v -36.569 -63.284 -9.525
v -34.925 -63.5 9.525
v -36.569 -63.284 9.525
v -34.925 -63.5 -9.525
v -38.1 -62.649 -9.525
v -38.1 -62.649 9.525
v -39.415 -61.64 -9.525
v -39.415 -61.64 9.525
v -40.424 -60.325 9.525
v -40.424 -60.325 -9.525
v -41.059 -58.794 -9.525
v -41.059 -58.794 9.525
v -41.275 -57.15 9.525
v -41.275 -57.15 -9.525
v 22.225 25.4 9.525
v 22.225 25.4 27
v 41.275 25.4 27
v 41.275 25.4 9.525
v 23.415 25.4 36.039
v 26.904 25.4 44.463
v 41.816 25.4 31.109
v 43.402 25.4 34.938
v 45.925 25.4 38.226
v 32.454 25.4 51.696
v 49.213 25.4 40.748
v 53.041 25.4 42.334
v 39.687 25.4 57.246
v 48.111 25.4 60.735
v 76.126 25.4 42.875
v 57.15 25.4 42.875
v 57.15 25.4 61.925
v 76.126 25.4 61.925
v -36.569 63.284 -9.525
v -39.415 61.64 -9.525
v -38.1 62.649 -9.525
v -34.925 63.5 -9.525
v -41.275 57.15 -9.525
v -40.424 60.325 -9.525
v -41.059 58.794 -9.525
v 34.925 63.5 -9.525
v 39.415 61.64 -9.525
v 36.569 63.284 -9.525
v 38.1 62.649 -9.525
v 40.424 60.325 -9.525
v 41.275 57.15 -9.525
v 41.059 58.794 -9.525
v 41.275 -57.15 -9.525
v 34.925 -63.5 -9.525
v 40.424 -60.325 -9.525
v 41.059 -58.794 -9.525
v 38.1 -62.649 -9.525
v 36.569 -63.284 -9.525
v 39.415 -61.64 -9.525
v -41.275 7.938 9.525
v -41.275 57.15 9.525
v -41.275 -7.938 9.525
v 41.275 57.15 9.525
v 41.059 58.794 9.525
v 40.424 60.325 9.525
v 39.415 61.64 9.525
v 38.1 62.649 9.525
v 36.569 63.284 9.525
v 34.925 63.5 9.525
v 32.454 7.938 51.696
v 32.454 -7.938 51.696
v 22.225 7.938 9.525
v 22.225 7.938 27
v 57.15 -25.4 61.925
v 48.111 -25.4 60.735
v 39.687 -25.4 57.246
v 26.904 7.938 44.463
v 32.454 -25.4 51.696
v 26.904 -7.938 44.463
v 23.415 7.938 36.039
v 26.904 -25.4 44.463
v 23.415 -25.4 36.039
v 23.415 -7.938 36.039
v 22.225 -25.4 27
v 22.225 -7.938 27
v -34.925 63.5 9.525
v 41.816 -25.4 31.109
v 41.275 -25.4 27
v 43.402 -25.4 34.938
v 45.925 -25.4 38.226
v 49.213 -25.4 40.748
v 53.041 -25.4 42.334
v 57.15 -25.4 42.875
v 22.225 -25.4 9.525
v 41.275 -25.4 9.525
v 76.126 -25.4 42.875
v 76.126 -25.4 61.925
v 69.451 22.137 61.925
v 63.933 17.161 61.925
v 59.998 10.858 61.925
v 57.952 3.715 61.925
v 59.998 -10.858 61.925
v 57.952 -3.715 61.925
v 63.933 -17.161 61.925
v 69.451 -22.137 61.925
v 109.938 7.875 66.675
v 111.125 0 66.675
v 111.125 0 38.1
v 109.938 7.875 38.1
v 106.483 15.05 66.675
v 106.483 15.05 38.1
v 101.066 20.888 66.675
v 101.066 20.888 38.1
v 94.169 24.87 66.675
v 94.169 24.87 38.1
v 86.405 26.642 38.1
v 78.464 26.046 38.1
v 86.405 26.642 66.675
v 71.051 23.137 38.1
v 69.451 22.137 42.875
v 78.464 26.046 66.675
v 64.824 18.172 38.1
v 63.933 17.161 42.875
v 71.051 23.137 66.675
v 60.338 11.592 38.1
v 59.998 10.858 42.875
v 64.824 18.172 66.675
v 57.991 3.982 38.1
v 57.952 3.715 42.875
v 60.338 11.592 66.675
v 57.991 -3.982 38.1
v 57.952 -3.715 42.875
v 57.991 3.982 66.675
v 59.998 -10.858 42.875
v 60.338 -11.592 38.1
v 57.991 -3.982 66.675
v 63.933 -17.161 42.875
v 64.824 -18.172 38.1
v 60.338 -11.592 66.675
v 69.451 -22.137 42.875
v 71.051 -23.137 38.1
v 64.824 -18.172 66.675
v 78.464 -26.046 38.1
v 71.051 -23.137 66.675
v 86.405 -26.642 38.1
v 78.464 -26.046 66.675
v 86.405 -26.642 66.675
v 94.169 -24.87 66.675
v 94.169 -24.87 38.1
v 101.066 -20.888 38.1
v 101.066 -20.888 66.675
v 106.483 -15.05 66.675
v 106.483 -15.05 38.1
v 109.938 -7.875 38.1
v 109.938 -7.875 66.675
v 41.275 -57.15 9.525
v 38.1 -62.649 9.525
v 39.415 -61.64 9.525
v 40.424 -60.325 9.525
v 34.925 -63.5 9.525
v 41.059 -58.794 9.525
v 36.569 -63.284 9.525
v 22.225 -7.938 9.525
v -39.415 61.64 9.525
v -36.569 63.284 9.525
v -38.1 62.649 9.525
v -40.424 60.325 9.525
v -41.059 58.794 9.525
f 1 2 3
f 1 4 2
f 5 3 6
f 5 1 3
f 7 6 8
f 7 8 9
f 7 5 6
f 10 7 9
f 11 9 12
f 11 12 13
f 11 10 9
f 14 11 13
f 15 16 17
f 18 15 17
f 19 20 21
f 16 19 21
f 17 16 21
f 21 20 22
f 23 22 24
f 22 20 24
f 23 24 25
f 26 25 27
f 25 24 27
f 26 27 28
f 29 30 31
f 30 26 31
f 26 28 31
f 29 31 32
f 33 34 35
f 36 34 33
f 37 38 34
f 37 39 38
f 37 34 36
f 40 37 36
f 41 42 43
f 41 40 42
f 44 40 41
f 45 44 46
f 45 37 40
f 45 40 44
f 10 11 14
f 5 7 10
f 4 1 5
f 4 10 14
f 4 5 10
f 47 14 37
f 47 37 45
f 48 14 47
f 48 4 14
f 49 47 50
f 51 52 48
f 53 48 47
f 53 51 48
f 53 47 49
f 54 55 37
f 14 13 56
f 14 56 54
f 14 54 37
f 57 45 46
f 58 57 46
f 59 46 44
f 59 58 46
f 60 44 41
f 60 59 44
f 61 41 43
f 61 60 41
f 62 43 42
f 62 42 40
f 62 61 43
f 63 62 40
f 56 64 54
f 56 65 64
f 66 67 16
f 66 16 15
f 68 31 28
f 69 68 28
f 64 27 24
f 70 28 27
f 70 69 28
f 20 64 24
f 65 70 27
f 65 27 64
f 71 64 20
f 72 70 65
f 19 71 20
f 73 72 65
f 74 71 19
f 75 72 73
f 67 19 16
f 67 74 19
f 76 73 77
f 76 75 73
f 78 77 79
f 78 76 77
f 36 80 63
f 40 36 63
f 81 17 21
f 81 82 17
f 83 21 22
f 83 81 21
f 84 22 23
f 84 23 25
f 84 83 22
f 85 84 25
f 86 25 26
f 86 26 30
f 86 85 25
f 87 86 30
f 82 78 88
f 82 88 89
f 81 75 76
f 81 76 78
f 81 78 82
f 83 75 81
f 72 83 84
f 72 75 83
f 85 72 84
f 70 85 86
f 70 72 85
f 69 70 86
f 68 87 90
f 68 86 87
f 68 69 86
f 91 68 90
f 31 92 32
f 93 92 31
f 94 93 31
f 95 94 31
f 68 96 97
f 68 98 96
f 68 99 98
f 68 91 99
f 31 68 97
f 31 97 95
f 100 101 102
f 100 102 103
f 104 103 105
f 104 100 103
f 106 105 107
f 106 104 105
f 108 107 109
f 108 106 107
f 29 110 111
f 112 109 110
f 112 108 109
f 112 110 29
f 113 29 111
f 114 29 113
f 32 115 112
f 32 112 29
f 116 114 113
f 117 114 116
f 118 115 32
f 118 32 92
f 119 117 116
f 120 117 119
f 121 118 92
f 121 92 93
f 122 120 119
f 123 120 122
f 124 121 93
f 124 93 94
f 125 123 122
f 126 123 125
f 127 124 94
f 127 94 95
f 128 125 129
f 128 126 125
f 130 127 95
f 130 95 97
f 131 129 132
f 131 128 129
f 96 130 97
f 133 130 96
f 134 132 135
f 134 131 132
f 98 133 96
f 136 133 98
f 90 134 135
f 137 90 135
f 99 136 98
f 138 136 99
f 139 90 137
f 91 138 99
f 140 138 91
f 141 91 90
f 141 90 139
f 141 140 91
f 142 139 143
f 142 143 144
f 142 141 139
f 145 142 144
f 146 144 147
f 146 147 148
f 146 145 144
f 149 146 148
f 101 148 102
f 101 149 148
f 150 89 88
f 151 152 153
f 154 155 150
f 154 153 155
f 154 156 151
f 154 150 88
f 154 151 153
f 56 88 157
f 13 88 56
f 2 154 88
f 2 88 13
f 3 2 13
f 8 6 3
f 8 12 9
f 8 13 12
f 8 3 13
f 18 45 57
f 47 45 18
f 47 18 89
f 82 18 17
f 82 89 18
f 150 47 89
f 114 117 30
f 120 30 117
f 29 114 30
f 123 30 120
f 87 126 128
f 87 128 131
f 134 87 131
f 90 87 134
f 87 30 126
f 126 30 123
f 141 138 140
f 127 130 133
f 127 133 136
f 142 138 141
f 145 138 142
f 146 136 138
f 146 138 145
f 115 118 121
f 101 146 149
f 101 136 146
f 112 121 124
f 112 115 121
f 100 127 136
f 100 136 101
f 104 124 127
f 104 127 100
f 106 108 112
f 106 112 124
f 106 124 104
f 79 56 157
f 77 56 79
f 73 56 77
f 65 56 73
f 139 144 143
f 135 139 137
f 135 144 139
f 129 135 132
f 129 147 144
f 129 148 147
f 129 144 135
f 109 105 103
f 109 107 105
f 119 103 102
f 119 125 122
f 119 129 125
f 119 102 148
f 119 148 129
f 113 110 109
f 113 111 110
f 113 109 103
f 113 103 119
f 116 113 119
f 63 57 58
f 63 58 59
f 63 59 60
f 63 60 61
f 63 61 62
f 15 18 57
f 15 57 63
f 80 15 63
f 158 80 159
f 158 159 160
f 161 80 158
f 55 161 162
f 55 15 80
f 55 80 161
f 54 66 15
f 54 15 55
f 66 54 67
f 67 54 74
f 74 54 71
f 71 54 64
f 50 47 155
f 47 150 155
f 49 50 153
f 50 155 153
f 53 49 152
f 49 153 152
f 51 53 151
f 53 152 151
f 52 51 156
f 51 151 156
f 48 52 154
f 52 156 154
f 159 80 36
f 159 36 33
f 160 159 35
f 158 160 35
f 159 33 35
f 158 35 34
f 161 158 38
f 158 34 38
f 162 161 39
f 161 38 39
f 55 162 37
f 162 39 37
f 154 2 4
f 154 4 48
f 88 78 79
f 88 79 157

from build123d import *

# Parameters (mm, degrees)
F1_DEPTH = 63.5
F0_W     = 24.0836695663
F0_H     = 19.05
F2_DEPTH = 25.4
F3_DEPTH = 7.9375
F5_R     = 6.35


with BuildPart() as f1:
    # F0 (on Front) → F1 (new body, symmetric)
    with BuildSketch(Plane.XZ):
        Polygon((41.275, -9.525), (41.275, 9.525), (22.225, 9.525), (-41.275, 9.525), (-41.275, -9.525), align=None)
    extrude(amount=F1_DEPTH, both=True)

    # F0 (on Front) → F2 (join, symmetric)
    with BuildSketch(Plane.XZ):
        with Locations((72.3668347831, 52.4002)):
            Rectangle(F0_W, F0_H)
        with BuildLine():
            Line((22.225, 9.525), (41.275, 9.525))
            Line((41.275, 9.525), (41.275, 27.0002))
            ThreePointArc((41.275, 27.0002), (45.9246798487, 38.2255201513), (57.15, 42.8752))
            Line((57.15, 42.8752), (60.325, 42.8752))
            Line((60.325, 42.8752), (60.325, 61.9252))
            Line((60.325, 61.9252), (57.15, 61.9252))
            ThreePointArc((57.15, 61.9252), (43.7847811246, 59.266692673), (32.4542956671, 51.6959043329))
            ThreePointArc((32.4542956671, 51.6959043329), (24.883507327, 40.3654188754), (22.225, 27.0002))
            Line((22.225, 27.0002), (22.225, 9.525))
        make_face()
    extrude(amount=F2_DEPTH, both=True)

    # F0 (on Front) → F3 (join, symmetric)
    with BuildSketch(Plane.XZ):
        with BuildLine():
            Line((-41.275, 9.525), (22.225, 9.525))
            Line((22.225, 9.525), (22.225, 27.0002))
            ThreePointArc((22.225, 27.0002), (24.883507327, 40.3654188754), (32.4542956671, 51.6959043329))
            Line((32.4542956671, 51.6959043329), (-41.275, 9.525))
        make_face()
    extrude(amount=F3_DEPTH, both=True)

    # F0 (on Front) → F4 (revolve)
    with BuildSketch(Plane.XZ):
        Polygon((84.4086695663, 61.9252), (84.4086695663, 42.8752), (84.4086695663, 38.1), (111.125, 38.1), (111.125, 66.675), (84.4086695663, 66.675), align=None)
    revolve(axis=Axis((84.4086695663, 0, 52.3875), (0, 0, 1)))

    # F5
    f5_edges = [f1.edges().sort_by_distance(p)[0] for p in [
        (41.275, -63.5, 0),
        (-41.275, -63.5, 0),
        (-41.275, 63.5, 0),
        (41.275, 63.5, 0),
    ]]
    fillet(f5_edges, radius=F5_R)


solid = f1.part
